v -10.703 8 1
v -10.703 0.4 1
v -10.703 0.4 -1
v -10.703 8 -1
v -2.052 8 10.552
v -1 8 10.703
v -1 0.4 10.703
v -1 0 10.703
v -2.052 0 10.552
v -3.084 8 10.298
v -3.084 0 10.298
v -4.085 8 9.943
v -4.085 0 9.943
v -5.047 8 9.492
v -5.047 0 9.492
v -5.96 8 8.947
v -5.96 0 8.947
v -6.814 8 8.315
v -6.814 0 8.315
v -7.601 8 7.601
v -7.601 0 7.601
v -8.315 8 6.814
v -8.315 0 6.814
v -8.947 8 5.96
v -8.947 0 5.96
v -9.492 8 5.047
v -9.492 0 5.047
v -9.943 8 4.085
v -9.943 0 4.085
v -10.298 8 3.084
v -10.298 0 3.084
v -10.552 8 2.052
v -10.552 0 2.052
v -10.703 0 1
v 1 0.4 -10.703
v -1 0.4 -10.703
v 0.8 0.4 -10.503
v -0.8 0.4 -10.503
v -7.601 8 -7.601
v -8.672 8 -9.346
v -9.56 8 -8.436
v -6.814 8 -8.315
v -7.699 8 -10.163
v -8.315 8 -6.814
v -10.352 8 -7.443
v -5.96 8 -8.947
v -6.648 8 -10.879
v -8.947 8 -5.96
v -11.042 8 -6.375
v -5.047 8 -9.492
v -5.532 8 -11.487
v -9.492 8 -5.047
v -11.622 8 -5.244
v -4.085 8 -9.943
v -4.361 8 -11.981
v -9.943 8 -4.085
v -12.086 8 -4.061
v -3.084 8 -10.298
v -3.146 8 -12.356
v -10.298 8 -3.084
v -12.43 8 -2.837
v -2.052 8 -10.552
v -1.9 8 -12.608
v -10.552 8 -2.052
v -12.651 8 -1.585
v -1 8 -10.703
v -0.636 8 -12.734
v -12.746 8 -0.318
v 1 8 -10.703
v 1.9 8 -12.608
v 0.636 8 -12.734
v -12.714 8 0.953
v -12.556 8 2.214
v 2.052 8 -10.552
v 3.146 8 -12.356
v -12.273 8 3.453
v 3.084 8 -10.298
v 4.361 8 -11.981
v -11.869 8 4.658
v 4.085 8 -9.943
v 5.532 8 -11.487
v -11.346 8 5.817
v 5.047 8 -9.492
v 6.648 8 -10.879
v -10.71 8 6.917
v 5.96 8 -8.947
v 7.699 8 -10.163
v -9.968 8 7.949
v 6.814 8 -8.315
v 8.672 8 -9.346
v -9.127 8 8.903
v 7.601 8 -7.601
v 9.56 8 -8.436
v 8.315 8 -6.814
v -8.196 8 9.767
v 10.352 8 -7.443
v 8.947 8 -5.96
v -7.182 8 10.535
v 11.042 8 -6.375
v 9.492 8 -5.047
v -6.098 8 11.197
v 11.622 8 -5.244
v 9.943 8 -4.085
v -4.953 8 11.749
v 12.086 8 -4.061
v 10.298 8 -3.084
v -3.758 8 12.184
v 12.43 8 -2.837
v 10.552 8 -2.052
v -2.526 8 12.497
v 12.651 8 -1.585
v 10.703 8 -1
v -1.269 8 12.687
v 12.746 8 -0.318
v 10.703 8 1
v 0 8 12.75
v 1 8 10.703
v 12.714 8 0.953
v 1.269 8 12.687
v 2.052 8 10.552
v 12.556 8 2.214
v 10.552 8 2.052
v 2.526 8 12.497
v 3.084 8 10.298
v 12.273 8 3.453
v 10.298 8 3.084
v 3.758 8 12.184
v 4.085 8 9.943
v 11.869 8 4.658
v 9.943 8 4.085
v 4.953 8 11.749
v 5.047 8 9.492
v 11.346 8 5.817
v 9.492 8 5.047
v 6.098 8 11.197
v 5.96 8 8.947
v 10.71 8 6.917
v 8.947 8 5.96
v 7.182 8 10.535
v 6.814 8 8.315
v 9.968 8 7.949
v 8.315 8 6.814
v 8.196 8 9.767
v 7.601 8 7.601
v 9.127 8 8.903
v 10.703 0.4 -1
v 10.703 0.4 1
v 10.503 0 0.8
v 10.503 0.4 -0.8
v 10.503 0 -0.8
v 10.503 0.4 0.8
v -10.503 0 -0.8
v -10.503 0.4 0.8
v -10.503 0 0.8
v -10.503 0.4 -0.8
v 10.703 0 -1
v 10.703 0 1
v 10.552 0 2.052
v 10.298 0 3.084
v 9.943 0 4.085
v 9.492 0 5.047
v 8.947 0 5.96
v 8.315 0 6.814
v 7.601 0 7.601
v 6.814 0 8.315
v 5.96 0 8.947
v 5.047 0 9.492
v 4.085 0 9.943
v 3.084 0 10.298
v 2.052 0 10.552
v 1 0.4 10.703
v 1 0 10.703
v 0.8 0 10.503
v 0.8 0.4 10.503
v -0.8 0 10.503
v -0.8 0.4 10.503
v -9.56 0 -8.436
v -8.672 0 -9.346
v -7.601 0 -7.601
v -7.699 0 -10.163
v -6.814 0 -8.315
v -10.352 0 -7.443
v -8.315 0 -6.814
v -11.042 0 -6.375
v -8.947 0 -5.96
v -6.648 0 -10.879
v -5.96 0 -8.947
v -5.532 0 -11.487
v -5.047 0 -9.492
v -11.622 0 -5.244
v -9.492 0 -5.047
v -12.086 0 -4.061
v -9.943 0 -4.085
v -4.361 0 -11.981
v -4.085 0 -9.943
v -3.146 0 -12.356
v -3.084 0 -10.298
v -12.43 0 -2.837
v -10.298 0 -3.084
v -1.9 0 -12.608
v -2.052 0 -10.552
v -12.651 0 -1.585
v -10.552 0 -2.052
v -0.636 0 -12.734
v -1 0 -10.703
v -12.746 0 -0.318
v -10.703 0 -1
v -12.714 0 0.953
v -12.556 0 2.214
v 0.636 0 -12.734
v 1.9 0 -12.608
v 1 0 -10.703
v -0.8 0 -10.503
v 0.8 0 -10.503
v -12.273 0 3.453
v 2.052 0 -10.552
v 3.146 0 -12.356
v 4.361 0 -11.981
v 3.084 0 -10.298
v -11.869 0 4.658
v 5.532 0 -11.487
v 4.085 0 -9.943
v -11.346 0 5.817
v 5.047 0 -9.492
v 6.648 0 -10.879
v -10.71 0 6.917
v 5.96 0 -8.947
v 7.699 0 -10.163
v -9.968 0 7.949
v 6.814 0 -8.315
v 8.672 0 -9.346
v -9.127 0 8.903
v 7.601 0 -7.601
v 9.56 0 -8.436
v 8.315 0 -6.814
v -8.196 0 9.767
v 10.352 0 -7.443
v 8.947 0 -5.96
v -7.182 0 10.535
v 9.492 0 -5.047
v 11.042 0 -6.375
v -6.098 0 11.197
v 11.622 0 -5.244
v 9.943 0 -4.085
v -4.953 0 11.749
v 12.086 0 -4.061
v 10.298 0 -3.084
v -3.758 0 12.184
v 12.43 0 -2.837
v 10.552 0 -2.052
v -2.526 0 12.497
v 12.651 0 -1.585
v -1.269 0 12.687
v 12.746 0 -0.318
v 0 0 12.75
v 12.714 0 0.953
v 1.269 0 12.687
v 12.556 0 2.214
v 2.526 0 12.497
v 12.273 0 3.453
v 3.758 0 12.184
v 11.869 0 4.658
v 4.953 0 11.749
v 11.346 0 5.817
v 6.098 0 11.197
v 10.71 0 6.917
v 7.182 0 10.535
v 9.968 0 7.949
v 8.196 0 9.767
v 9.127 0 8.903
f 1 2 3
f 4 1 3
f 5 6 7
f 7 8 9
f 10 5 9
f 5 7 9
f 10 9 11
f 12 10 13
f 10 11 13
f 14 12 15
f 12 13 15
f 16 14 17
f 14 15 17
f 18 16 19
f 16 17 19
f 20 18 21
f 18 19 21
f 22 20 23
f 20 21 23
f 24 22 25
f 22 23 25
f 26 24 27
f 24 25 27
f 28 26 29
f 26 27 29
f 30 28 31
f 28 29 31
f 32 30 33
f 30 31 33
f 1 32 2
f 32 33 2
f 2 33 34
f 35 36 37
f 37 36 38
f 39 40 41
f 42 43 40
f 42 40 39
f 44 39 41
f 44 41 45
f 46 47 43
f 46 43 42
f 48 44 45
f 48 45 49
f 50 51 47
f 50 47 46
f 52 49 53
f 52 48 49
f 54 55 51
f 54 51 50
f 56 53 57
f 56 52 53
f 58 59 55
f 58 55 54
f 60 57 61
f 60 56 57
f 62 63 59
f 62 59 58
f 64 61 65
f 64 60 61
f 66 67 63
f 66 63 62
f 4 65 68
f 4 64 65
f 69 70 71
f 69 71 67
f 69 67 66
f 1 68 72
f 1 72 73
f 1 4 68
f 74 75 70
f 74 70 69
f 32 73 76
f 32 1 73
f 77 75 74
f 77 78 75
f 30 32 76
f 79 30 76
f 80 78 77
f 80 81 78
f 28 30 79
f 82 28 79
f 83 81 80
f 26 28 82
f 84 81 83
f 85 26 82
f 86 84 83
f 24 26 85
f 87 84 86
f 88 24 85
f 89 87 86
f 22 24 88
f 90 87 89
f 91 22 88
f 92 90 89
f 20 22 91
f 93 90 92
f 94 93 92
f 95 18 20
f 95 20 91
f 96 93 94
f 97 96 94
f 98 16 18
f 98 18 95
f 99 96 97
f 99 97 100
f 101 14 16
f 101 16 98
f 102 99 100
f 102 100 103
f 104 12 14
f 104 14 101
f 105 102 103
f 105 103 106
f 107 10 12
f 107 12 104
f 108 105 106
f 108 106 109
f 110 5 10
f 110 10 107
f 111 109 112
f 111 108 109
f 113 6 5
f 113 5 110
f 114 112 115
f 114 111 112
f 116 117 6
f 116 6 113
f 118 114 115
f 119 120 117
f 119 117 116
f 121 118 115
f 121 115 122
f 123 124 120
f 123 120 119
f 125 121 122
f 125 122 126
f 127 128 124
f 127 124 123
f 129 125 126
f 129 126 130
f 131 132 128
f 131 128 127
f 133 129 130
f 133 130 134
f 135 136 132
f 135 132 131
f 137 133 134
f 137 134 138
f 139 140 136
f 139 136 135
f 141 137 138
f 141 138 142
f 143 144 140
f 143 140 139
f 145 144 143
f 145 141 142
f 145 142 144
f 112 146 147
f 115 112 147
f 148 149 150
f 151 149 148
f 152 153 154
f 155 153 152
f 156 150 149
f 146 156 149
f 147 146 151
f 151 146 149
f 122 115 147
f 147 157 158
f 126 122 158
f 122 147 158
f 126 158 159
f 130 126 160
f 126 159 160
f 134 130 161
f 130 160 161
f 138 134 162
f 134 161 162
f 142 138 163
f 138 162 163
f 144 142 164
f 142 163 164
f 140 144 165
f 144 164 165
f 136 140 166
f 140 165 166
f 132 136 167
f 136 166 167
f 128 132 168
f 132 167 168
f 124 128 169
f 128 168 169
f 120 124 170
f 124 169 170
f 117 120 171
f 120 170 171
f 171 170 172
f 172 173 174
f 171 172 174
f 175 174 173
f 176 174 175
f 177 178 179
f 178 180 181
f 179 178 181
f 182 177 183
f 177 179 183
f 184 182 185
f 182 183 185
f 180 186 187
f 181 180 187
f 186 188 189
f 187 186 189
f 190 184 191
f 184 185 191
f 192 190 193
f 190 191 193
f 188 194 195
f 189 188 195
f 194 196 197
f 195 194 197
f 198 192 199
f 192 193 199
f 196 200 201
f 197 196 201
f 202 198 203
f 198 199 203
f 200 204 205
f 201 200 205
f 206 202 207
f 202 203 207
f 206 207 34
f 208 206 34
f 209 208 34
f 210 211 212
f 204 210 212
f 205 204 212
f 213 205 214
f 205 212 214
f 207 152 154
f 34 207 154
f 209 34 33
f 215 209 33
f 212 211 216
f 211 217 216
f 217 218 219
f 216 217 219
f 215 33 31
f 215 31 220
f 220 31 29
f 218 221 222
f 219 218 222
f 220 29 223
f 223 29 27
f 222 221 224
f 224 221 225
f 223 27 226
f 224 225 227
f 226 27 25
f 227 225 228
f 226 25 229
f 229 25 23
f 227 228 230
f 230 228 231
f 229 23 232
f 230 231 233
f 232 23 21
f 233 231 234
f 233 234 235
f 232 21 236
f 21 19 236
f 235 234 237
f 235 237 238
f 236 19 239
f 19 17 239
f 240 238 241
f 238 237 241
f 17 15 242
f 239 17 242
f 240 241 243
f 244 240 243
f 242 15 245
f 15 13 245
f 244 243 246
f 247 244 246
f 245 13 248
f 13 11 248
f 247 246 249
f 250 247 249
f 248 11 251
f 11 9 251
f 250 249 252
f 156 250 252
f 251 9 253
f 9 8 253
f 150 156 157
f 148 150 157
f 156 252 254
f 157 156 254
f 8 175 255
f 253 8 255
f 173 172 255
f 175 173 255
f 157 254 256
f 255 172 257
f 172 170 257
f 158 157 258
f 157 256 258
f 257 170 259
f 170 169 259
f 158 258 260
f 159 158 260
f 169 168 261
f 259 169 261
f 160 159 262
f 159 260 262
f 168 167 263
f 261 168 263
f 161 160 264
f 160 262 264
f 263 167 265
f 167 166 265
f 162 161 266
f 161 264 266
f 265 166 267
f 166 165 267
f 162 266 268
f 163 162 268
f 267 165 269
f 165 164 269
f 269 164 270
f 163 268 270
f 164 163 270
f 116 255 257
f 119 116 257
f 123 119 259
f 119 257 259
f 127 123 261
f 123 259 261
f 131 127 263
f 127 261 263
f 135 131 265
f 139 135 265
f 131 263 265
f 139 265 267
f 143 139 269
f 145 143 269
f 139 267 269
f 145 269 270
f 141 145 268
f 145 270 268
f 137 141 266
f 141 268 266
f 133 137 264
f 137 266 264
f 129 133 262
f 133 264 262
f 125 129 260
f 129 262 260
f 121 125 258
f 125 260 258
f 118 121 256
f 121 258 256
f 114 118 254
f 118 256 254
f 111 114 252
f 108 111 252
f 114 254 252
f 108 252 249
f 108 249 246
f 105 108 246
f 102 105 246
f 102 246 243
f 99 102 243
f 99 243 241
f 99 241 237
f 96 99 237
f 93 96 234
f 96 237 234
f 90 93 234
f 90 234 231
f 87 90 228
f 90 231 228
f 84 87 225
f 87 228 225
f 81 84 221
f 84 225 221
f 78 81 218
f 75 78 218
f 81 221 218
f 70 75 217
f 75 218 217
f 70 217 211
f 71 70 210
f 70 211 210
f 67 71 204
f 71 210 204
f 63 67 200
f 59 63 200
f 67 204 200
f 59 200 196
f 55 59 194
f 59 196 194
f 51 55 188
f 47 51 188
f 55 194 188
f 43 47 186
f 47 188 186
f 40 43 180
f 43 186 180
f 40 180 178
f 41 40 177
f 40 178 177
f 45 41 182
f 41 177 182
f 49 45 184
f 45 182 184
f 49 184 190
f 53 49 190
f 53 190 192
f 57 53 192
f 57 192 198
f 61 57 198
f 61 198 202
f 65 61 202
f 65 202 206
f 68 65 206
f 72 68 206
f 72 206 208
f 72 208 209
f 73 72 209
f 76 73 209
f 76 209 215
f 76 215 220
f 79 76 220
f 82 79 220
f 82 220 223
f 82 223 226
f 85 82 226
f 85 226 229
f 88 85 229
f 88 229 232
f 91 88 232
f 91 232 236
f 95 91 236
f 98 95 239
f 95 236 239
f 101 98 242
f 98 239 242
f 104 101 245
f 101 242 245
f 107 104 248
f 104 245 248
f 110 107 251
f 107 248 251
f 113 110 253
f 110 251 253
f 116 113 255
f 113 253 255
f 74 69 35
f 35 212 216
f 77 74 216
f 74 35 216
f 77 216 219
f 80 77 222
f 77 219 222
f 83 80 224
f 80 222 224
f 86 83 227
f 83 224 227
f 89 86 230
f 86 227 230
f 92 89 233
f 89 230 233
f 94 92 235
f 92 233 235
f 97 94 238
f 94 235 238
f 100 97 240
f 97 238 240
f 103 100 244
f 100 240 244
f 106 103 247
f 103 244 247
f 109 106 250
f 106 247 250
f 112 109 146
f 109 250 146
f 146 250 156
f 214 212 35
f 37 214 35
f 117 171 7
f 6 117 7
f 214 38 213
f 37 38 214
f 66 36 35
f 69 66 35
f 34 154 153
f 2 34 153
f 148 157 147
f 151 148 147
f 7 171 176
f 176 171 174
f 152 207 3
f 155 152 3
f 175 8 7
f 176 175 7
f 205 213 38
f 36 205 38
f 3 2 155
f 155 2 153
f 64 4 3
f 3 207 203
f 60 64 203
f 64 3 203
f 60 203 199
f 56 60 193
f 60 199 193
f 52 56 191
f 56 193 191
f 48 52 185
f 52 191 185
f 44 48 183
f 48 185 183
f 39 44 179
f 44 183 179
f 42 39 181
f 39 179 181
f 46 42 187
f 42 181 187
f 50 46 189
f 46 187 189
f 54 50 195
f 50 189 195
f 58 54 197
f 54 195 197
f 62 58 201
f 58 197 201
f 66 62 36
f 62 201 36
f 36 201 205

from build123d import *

# Parameters (mm, degrees)
SKETCH1_R           = 12.75
BOSS_EXTRUDE1_DEPTH = 8
SKETCH2_W           = 2
SKETCH2_H           = 0.4
BOSS_EXTRUDE2_DEPTH = 0.2
SKETCH3_W           = 2
SKETCH3_H           = 0.4
BOSS_EXTRUDE3_DEPTH = 0.2
SKETCH4_W           = 2
SKETCH4_H           = 0.4
BOSS_EXTRUDE4_DEPTH = 0.2
CHAMFER1_SIZE       = 0.2
SKETCH5_W           = 2
SKETCH5_H           = 0.4
BOSS_EXTRUDE5_DEPTH = 0.2
CHAMFER2_SIZE       = 0.2


with BuildPart() as part:
    # Sketch1 → Boss-Extrude1 (new body)
    with BuildSketch(Plane(origin=(0, 0, 0), x_dir=(1, 0, 0), z_dir=(0, 1, 0))):
        with Locations(Location((0, 0, 0), (0, 0, 270))):
            Circle(SKETCH1_R)
        with BuildLine():
            Line((-1, 10.703387314), (1, 10.703387314))
            ThreePointArc((1, 10.703387314), (7.601397898, 7.601397898), (10.703387314, 1))
            Line((10.703387314, 1), (10.703387314, -1))
            ThreePointArc((10.703387314, -1), (7.601397898, -7.601397898), (1, -10.703387314))
            Line((1, -10.703387314), (-1, -10.703387314))
            ThreePointArc((-1, -10.703387314), (-7.601397898, -7.601397898), (-10.703387314, -1))
            Line((-10.703387314, -1), (-10.703387314, 1))
            ThreePointArc((-10.703387314, 1), (-7.601397898, 7.601397898), (-1, 10.703387314))
        make_face(mode=Mode.SUBTRACT)
    extrude(amount=BOSS_EXTRUDE1_DEPTH)

    # Sketch2 → Boss-Extrude2 (add)
    with BuildSketch(Plane.XY.offset(-10.703387314)):
        with Locations((0, 0.2)):
            Rectangle(SKETCH2_W, SKETCH2_H)
    extrude(amount=BOSS_EXTRUDE2_DEPTH)

    # Sketch3 → Boss-Extrude3 (add)
    with BuildSketch(Plane(origin=(-10.703387314, 0, 0), x_dir=(0, 0, -1), z_dir=(1, 0, 0))):
        with Locations((0, 0.2)):
            Rectangle(SKETCH3_W, SKETCH3_H)
    extrude(amount=BOSS_EXTRUDE3_DEPTH)

    # Sketch4 → Boss-Extrude4 (add)
    with BuildSketch(Plane(origin=(0, 0, 10.703387314), x_dir=(-1, 0, 0), z_dir=(0, 0, -1))):
        with Locations((0, 0.2)):
            Rectangle(SKETCH4_W, SKETCH4_H)
    extrude(amount=BOSS_EXTRUDE4_DEPTH)

    # Chamfer1
    chamfer1_edges = [part.edges().sort_by_distance(p)[0] for p in [
        (1, 0.2, -10.503387314),
        (-1, 0.2, -10.503387314),
        (-10.503387314, 0.2, 1),
        (-10.503387314, 0.2, -1),
        (-1, 0.2, 10.503387314),
        (1, 0.2, 10.503387314),
    ]]
    chamfer(chamfer1_edges, length=CHAMFER1_SIZE - 0.0001)  # a hair under: the kernel refuses the full size

    # Sketch5 → Boss-Extrude5 (add)
    with BuildSketch(Plane.ZY.offset(-10.703387314)):
        with Locations((0, 0.2)):
            Rectangle(SKETCH5_W, SKETCH5_H)
    extrude(amount=BOSS_EXTRUDE5_DEPTH)

    # Chamfer2
    chamfer2_edges = [part.edges().sort_by_distance(p)[0] for p in [
        (10.503387314, 0.2, 1),
        (10.503387314, 0.2, -1),
    ]]
    chamfer(chamfer2_edges, length=CHAMFER2_SIZE - 0.0001)  # a hair under: the kernel refuses the full size


solid = part.part
